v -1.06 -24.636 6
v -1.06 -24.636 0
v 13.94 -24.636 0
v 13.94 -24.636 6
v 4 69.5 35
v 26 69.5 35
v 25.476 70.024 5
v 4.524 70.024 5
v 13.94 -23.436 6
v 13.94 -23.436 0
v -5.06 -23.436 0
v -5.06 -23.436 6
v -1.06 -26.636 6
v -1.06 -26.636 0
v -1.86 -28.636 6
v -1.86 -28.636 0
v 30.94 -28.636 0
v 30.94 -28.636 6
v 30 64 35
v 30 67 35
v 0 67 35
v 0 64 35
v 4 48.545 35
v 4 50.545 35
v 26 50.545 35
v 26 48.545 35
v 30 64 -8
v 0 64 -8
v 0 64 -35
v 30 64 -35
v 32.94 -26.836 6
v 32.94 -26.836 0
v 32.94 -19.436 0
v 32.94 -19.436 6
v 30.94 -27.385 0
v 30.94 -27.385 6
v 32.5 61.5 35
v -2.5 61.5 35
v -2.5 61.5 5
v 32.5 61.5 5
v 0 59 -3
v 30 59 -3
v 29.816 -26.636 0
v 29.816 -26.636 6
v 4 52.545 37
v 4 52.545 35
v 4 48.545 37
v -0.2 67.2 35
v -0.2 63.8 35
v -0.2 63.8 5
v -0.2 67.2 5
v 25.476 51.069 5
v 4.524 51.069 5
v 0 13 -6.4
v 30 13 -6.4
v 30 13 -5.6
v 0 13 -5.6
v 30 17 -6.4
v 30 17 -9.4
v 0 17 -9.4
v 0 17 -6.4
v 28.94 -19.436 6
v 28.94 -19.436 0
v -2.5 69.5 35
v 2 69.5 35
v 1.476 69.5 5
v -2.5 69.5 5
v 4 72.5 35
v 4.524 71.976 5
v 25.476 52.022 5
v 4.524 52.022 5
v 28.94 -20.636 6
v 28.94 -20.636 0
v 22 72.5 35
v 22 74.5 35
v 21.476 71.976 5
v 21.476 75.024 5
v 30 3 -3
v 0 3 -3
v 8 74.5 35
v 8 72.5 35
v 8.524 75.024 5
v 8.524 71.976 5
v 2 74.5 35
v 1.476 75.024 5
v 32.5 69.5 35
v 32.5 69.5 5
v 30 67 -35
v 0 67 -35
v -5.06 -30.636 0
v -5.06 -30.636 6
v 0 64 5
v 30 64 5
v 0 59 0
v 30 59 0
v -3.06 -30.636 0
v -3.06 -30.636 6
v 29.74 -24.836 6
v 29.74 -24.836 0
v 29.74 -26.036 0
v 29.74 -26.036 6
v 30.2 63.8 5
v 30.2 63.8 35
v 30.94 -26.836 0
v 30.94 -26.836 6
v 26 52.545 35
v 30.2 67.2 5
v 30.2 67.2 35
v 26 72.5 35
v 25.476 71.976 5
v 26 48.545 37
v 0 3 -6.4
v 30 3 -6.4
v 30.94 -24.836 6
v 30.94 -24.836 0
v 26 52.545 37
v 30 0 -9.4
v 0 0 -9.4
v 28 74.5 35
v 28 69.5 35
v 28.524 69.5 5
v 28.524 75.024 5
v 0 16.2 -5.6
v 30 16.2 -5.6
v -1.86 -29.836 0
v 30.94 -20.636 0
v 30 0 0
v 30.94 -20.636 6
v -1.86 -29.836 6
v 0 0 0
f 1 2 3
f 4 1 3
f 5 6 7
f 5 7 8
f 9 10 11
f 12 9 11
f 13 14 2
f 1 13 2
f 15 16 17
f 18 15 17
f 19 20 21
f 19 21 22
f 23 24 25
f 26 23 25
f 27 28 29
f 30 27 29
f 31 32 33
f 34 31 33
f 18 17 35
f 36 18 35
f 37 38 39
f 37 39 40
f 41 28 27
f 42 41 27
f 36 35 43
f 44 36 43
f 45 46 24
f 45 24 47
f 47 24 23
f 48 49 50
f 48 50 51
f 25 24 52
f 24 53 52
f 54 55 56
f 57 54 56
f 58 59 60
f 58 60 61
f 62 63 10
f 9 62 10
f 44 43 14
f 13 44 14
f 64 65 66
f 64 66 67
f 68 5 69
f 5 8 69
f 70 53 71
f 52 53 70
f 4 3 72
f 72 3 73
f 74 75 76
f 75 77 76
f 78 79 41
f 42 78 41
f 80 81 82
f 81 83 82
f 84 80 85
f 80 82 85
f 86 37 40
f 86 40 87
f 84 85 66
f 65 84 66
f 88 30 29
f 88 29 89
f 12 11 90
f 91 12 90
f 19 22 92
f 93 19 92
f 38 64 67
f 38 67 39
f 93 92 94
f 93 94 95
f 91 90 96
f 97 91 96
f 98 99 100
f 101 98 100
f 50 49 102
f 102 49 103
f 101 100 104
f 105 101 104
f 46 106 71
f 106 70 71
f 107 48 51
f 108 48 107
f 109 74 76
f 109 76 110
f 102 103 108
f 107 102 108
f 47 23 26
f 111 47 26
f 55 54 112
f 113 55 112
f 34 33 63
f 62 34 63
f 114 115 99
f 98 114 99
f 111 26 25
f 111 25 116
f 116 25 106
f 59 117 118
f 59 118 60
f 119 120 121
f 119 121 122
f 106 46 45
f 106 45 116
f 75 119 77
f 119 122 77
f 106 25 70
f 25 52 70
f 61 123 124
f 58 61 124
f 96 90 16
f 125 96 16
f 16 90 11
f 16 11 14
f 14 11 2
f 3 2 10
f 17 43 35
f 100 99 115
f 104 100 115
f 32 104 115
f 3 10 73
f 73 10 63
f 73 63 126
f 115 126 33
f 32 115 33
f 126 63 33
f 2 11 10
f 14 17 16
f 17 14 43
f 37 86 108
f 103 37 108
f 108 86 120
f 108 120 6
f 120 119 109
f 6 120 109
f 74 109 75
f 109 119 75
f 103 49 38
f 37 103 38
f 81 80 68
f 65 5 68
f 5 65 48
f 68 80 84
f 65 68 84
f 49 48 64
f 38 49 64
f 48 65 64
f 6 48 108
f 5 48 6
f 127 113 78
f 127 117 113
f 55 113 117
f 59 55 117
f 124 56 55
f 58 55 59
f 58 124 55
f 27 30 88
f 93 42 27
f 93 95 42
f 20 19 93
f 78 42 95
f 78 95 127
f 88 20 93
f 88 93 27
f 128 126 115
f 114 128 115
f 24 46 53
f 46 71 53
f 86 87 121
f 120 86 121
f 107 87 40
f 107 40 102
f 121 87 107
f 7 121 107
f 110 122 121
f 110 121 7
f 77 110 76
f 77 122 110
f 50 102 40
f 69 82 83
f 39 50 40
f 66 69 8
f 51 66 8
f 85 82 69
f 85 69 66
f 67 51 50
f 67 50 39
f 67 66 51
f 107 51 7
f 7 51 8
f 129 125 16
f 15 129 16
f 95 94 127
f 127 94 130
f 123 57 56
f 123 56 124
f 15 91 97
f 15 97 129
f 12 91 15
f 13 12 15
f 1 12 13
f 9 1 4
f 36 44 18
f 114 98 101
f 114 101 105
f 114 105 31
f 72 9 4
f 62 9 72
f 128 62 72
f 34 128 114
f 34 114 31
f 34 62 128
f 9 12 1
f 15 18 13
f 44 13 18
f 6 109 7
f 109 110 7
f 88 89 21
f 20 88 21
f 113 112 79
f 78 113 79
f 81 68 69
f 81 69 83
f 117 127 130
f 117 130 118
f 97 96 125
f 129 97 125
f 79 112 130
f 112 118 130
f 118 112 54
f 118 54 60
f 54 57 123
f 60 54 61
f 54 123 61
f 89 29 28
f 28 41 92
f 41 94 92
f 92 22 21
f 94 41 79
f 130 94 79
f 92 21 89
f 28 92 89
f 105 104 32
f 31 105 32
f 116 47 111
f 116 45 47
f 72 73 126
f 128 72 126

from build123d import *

# Parameters (mm, degrees)
F0_W      = 5
F0_H      = 5
F0_W_2    = 4
F0_H_2    = 0.8
F1_DEPTH  = 30
F3_W      = 30.4
F3_H      = 3.4
F4_DEPTH  = 30
F5_SIZE   = 0.8
F6_SIZE   = 4.99999
F3_W_2    = 22
F3_H_2    = 2
F7_DEPTH  = 30
F7_TAPER  = 1
F8_DEPTH  = 2
F9_W      = 30
F9_H      = 2
F9_W_2    = 15
F9_H_2    = 1.2
F9_W_3    = 2
F10_DEPTH = 6
F3_W_3    = 2
F3_H_3    = 3
F11_DEPTH = 30
F11_TAPER = -1


# Not quite as in the source:
# - a fillet or chamfer is up to 0.001 mm smaller than in the source, because OpenCascade refuses the exact size
# - a feature names something its author has since deleted; it is built from what else it names


with BuildPart() as f1:
    # F0 (on Right) → F1 (new body)
    with BuildSketch(Plane.YZ):
        Polygon((59, 0), (0, 0), (0, -3), (3, -3), (59, -3), (64, -3), (64, 0), align=None)
        with Locations((61.5, 2.5)):
            Rectangle(F0_W, F0_H)
        Polygon((3, -3), (0, -3), (0, -9.4), (3, -9.4), (3, -6.4), align=None)
        Polygon((67, 0), (64, 0), (64, -3), (64, -8), (64, -35), (67, -35), align=None)
        Polygon((64, 5), (64, 0), (67, 0), (67, 35), (64, 35), align=None)
        with Locations((61.5, -5.5)):
            Rectangle(F0_W, F0_H)
        Polygon((13, -6.4), (3, -6.4), (3, -9.4), (17, -9.4), (17, -6.4), align=None)
        with Locations((15, -6)):
            Rectangle(F0_W_2, F0_H_2)
    extrude(amount=F1_DEPTH)

    # F5
    f5_edges = [f1.edges().sort_by_distance(p)[0] for p in [
        (15, 17, -5.6),
    ]]
    chamfer(f5_edges, length=F5_SIZE)

    # F6 (size 5 in the source; OpenCascade refuses exactly that, so slightly less here)
    f6_edges = [f1.edges().sort_by_distance(p)[0] for p in [
        (15, 59, 5),
        (15, 59, -8),
    ]]
    chamfer(f6_edges, length=F6_SIZE)


with BuildPart() as f4:
    # F3 (on offset) → F4 (new body)
    with BuildSketch(Plane.XY.offset(35)):
        Polygon((2, 69.5), (-2.5, 69.5), (-2.5, 61.5), (32.5, 61.5), (32.5, 69.5), (28, 69.5), (28, 68.5), (2, 68.5), align=None)
        with Locations((15, 65.5)):
            Rectangle(F3_W, F3_H, mode=Mode.SUBTRACT)
        Polygon((4, 69.5), (2, 69.5), (2, 68.5), (28, 68.5), (28, 69.5), (26, 69.5), align=None)
    extrude(amount=-F4_DEPTH)

    # F3 (on offset) → F11 (join)
    with BuildSketch(Plane.XY.offset(35)):
        Polygon((22, 72.5), (26, 72.5), (28, 72.5), (28, 74.5), (22, 74.5), align=None)
        with Locations((27, 71)):
            Rectangle(F3_W_3, F3_H_3)
        Polygon((4, 69.5), (2, 69.5), (2, 68.5), (28, 68.5), (28, 69.5), (26, 69.5), align=None)
        Polygon((2, 74.5), (2, 72.5), (4, 72.5), (8, 72.5), (8, 74.5), align=None)
        with Locations((3, 71)):
            Rectangle(F3_W_3, F3_H_3)
    extrude(amount=-F11_DEPTH, taper=F11_TAPER)


with BuildPart() as f7:
    # F3 (on offset) → F7 (new body)
    with BuildSketch(Plane.XY.offset(35)):
        with Locations((15, 51.545239985)):
            Rectangle(F3_W_2, F3_H_2)
    extrude(amount=-F7_DEPTH, taper=F7_TAPER)

    # F3 (on offset) → F8 (join)
    with BuildSketch(Plane.XY.offset(35)):
        with Locations((15, 49.545239985)):
            Rectangle(F3_W_2, F3_H_2)
        with Locations((15, 51.545239985)):
            Rectangle(F3_W_2, F3_H_2)
    extrude(amount=F8_DEPTH)


with BuildPart() as f10:
    # F9 (on Top) → F10 (new body)
    with BuildSketch(Plane.XY):
        with Locations((13.9398306429, -27.6358266532)):
            Rectangle(F9_W, F9_H)
        Polygon((-1.0601693571, -28.6358266532), (-1.0601693571, -26.6358266532), (-1.0601693571, -24.6358266532), (-1.0601693571, -23.4358266532), (-5.0601693571, -23.4358266532), (-5.0601693571, -28.6358266532), (-3.0601693571, -28.6358266532), (-1.8601693571, -28.6358266532), align=None)
        with Locations((6.4398306429, -24.0358266532)):
            Rectangle(F9_W_2, F9_H_2)
        Polygon((13.9398306429, -23.4358266532), (13.9398306429, -24.6358266532), (28.9398306429, -20.6358266532), (28.9398306429, -19.4358266532), align=None)
        Polygon((29.8163002714, -26.6358266532), (28.9398306429, -26.6358266532), (28.9398306429, -28.6358266532), (30.9398306429, -28.6358266532), (30.9398306429, -27.3848469009), align=None)
        Polygon((28.9398306429, -19.4358266532), (28.9398306429, -20.6358266532), (30.9398306429, -20.6358266532), (32.9398306429, -20.6358266532), (32.9398306429, -19.4358266532), align=None)
        Polygon((30.9398306429, -24.8358266532), (30.9398306429, -26.6358266532), (30.9398306429, -26.8358266532), (32.9398306429, -26.8358266532), (32.9398306429, -20.6358266532), (30.9398306429, -20.6358266532), align=None)
        Polygon((29.7398306429, -26.0358266532), (30.6398306429, -26.6358266532), (30.9398306429, -26.6358266532), (30.9398306429, -24.8358266532), (29.7398306429, -24.8358266532), align=None)
        with Locations((-4.0601693571, -29.6358266532)):
            Rectangle(F9_W_3, F9_H)
        Polygon((-1.8601693571, -29.8358266532), (-1.8601693571, -28.6358266532), (-3.0601693571, -28.6358266532), (-3.0601693571, -30.6358266532), align=None)
        Polygon((30.9398306429, -26.6358266532), (30.6398306429, -26.6358266532), (30.9398306429, -26.8358266532), align=None)
    extrude(amount=F10_DEPTH)


solid = Compound([f1.part, f4.part, f7.part, f10.part])
